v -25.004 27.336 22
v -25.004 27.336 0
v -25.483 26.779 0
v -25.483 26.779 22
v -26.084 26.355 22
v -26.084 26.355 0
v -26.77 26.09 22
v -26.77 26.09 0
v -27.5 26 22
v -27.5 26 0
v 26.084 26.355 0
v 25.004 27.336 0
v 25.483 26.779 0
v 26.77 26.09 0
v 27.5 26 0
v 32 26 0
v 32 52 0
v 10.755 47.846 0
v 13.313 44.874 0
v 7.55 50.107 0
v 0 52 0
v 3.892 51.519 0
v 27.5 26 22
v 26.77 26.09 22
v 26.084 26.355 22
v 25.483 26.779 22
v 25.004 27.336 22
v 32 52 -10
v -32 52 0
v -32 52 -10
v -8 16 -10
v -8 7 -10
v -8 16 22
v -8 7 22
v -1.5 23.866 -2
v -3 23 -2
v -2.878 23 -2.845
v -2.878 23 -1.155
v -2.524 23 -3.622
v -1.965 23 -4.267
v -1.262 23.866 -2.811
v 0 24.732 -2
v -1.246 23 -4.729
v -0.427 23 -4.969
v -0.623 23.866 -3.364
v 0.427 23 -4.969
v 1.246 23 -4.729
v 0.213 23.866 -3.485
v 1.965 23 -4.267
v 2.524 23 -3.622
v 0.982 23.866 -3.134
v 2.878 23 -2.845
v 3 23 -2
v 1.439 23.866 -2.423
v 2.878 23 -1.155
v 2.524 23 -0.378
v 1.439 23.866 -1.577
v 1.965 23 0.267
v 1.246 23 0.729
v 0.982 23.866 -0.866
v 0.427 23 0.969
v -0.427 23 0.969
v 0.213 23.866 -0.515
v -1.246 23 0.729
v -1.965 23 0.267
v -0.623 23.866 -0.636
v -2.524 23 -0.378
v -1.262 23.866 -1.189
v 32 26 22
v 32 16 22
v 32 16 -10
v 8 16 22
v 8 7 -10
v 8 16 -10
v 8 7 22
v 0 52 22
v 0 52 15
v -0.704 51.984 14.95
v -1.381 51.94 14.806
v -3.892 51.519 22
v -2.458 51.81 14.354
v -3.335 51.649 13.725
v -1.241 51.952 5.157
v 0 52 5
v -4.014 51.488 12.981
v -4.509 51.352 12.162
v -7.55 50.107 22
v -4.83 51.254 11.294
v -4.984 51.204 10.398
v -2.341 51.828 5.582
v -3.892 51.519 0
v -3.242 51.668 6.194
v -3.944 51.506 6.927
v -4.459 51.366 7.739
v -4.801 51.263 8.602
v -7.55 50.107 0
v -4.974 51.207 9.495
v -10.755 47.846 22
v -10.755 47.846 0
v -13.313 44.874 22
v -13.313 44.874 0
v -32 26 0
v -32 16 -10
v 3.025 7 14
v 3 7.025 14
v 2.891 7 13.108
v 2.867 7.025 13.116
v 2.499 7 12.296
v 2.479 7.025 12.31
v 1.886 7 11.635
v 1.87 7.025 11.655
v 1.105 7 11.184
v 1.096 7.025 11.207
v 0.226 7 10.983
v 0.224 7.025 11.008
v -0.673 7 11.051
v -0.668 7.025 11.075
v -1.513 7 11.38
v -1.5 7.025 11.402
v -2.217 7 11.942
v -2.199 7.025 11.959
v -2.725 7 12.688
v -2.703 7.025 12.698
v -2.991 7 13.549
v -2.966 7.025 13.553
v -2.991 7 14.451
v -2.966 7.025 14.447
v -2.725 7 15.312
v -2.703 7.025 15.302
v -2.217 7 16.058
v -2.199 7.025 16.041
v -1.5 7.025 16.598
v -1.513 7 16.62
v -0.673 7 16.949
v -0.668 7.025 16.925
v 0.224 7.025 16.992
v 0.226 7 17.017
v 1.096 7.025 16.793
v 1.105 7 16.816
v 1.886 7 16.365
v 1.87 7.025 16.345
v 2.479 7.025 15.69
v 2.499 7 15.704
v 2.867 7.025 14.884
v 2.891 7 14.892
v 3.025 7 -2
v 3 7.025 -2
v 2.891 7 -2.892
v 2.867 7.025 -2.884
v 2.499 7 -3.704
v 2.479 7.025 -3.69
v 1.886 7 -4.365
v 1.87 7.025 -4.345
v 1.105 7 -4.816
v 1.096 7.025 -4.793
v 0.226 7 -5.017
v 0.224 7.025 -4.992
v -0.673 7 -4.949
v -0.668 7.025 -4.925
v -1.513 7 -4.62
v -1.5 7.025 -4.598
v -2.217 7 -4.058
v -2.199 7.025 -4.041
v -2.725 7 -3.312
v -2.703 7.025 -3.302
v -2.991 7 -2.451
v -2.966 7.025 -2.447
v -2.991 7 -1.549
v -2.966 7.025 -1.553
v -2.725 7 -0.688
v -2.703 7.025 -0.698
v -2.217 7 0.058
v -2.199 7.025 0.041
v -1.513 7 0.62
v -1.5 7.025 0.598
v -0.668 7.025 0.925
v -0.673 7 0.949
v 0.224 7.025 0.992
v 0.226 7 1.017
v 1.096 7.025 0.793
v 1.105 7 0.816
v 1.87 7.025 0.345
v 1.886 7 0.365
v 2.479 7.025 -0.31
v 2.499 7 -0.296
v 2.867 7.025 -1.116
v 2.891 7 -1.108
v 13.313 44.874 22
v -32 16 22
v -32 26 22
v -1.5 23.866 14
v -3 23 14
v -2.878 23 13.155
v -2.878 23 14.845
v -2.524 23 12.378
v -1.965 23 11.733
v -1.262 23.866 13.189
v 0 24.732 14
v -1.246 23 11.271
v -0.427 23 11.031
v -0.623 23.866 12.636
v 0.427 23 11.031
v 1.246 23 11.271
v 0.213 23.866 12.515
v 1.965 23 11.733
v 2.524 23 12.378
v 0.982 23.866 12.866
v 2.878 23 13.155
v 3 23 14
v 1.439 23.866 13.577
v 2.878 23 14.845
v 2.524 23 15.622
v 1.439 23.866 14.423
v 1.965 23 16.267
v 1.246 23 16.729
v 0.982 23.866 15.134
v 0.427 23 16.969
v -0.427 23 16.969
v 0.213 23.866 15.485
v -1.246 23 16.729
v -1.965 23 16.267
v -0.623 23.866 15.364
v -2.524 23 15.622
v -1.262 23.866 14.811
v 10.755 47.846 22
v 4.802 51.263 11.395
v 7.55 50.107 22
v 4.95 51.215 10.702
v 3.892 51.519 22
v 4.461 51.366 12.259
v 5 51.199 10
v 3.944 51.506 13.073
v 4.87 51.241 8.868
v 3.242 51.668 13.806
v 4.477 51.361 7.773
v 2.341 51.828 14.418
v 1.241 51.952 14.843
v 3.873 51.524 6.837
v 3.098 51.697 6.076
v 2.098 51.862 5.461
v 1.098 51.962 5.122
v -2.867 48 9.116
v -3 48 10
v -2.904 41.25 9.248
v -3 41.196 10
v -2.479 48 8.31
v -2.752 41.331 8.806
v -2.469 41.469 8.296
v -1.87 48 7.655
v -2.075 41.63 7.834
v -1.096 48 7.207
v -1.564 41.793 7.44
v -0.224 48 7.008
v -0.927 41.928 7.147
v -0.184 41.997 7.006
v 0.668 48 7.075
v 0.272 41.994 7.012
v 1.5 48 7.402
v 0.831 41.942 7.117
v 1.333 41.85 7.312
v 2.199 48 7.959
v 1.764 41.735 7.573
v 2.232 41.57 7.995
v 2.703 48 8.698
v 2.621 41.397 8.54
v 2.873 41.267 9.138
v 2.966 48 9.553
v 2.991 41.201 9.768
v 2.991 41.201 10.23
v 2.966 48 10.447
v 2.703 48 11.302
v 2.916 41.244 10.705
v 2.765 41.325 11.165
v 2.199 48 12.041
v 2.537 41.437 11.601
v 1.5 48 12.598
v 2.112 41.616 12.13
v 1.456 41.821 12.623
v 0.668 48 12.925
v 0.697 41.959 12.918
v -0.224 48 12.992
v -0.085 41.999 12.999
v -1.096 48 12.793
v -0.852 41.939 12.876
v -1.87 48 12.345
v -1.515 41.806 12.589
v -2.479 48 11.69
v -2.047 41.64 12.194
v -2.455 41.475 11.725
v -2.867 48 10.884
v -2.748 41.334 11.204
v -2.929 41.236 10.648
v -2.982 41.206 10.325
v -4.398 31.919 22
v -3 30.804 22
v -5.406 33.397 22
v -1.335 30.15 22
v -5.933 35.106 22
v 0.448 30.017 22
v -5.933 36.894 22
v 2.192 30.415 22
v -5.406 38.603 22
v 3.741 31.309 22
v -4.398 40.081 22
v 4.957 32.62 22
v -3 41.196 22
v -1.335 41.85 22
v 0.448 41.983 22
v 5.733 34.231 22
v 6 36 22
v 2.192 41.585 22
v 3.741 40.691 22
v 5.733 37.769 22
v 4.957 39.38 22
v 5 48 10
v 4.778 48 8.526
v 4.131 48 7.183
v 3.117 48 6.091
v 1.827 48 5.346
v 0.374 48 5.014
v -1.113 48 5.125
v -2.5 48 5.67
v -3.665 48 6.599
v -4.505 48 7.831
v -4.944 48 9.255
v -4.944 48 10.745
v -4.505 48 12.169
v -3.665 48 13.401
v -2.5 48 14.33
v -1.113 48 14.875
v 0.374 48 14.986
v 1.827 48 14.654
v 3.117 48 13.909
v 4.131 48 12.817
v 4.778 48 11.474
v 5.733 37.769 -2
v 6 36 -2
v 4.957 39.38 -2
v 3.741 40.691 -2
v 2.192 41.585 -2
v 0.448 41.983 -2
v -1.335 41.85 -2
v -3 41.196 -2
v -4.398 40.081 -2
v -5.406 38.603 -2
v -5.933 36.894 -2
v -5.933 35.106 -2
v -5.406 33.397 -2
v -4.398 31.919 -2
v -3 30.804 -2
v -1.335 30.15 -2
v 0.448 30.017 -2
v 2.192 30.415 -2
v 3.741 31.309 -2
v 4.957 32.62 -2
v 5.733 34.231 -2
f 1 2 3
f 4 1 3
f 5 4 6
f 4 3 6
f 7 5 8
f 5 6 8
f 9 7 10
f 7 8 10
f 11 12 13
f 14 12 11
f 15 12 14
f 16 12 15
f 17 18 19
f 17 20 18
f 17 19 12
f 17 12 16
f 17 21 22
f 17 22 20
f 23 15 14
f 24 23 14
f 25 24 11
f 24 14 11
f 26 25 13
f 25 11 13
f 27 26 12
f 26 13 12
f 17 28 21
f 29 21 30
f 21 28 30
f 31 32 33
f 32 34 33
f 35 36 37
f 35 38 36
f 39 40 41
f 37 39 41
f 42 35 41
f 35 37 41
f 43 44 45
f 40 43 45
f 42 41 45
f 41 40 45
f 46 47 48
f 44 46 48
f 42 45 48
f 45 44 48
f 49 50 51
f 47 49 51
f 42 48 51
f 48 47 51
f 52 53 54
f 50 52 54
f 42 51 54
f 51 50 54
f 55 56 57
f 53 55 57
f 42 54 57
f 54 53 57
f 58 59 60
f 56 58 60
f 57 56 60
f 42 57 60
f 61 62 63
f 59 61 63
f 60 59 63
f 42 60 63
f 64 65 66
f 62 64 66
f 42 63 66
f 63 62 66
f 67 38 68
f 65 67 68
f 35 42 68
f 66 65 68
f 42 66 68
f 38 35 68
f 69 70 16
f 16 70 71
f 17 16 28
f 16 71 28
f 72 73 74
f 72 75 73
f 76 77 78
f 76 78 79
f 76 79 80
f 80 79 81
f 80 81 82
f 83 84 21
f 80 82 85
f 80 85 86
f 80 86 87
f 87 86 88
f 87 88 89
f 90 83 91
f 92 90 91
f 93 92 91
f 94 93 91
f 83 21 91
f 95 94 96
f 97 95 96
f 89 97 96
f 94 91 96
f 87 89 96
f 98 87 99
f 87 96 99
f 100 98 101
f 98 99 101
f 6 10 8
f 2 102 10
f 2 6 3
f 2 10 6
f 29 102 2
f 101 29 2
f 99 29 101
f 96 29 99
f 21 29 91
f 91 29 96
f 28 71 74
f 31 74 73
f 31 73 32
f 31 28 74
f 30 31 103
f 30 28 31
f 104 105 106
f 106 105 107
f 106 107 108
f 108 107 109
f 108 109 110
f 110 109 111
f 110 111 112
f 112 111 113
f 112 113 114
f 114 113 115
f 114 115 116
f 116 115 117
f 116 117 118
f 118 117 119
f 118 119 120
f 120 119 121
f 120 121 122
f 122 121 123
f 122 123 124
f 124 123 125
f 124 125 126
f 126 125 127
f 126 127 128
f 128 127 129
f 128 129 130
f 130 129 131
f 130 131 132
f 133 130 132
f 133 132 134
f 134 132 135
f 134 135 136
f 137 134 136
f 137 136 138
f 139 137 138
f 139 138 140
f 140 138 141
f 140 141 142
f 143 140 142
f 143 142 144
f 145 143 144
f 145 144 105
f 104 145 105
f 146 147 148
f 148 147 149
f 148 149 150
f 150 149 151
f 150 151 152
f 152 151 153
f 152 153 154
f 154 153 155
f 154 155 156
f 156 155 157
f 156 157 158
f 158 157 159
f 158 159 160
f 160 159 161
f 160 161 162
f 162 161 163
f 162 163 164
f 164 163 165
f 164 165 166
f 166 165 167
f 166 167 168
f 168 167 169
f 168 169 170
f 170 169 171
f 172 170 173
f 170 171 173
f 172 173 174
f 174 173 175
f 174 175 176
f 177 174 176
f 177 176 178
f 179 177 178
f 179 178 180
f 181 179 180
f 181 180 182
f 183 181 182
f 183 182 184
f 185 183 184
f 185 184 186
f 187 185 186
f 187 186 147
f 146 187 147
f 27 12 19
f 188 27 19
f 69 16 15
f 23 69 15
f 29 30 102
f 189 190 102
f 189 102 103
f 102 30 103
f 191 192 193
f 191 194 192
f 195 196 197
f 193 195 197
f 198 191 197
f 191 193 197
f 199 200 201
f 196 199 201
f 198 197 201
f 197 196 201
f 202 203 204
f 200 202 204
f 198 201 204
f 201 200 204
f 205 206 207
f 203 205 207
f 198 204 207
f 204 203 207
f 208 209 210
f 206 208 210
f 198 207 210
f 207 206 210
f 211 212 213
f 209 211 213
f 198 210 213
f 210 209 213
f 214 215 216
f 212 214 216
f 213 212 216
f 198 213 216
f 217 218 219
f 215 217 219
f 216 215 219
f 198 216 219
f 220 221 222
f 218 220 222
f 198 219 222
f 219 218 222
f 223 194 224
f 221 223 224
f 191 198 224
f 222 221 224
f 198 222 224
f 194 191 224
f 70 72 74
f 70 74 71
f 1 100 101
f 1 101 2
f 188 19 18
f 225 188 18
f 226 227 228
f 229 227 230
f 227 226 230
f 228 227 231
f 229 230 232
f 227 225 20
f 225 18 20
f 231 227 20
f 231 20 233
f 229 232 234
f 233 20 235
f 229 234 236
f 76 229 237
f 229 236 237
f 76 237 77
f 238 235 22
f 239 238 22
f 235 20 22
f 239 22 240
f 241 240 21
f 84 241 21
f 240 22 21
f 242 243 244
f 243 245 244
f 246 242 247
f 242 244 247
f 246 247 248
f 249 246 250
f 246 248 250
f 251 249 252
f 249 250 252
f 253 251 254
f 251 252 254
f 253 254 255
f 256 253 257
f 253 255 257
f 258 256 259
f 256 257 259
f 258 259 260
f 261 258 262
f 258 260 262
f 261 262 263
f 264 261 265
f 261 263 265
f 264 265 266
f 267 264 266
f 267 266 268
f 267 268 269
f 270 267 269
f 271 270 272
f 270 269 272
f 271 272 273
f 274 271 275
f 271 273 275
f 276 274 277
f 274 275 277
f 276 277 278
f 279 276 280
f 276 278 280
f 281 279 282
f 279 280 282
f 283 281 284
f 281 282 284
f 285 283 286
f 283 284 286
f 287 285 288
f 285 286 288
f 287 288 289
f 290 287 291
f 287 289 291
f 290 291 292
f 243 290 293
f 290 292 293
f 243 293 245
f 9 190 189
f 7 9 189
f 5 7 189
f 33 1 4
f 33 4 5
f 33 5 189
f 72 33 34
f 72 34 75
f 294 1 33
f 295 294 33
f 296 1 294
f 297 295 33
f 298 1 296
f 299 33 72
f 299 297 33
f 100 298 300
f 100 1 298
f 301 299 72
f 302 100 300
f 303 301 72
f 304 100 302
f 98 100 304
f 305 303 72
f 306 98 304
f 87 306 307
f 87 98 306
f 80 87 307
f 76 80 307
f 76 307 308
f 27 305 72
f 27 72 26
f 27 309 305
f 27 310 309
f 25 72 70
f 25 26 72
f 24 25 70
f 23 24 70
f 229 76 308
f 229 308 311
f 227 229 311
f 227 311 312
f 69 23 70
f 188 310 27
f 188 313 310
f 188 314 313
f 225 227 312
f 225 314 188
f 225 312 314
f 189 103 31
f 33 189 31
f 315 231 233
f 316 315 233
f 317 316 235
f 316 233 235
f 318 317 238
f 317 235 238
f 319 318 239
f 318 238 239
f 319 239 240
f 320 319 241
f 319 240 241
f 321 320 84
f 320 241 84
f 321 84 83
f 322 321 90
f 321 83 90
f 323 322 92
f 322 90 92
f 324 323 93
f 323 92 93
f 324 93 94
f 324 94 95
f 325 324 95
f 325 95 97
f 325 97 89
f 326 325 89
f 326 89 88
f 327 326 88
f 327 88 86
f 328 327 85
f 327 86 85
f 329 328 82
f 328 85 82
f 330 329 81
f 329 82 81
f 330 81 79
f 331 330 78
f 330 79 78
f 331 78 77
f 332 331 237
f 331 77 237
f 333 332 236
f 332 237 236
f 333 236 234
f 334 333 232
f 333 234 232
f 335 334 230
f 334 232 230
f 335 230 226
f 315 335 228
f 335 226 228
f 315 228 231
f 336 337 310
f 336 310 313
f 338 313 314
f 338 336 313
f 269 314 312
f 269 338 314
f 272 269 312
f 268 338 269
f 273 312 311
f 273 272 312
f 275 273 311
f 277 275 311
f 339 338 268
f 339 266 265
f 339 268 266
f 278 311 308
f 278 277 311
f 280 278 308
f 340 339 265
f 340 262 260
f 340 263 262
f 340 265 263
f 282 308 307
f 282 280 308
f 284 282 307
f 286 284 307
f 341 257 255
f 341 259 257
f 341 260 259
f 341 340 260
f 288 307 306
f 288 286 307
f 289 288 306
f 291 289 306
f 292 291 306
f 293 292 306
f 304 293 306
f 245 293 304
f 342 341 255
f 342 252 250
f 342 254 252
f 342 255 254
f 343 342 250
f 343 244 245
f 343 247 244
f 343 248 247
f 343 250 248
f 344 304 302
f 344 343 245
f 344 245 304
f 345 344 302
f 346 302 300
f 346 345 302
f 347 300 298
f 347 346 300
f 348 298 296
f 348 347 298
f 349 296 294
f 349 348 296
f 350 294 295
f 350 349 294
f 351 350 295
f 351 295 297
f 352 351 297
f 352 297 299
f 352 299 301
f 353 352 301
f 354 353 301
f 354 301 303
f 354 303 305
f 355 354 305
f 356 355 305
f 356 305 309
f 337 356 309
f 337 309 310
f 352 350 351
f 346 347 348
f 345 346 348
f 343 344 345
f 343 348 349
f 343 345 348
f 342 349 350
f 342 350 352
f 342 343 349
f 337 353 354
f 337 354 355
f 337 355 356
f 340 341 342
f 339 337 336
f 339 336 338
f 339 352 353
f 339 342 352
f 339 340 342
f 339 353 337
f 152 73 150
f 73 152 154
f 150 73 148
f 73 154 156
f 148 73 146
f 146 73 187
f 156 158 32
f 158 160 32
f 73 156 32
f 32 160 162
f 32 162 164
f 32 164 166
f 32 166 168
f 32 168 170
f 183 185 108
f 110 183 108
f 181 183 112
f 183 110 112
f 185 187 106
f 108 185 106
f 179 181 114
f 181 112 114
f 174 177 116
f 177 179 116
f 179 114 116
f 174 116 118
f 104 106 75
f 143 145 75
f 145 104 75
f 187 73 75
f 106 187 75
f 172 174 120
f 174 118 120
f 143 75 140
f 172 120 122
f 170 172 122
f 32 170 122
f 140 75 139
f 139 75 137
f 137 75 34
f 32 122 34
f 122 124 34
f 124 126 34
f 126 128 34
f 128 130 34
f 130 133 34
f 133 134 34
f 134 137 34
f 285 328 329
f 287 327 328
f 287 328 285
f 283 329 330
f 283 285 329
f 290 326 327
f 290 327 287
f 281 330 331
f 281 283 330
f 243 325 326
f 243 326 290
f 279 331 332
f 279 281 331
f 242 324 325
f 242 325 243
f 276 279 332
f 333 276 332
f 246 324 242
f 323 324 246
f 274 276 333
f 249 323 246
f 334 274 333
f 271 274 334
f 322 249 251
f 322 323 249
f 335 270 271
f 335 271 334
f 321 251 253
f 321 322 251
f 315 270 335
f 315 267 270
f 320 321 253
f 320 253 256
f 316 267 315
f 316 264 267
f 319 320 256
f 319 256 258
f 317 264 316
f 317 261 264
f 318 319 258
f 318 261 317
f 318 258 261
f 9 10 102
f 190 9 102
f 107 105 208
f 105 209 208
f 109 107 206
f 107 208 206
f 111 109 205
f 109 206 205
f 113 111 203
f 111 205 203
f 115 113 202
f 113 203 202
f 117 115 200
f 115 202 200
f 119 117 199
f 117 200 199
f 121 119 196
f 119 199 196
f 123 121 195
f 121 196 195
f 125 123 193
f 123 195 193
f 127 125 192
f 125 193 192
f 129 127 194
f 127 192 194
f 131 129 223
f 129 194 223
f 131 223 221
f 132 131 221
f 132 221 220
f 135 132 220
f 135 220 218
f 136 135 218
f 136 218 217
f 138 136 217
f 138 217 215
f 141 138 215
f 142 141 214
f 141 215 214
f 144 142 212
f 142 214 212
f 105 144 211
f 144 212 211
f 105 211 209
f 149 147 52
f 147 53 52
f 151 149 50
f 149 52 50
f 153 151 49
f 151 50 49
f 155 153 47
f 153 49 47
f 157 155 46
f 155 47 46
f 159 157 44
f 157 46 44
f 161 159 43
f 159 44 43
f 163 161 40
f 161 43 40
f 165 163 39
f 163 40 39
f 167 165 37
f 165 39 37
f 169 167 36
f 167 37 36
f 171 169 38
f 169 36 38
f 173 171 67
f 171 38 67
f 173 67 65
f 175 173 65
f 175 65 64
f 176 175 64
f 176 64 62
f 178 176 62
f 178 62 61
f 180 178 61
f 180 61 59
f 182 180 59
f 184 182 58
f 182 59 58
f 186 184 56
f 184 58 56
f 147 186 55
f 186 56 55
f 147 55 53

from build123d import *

# Parameters (mm, degrees)
SKETCH2_R                       = 6
SKETCH2_W                       = 16
SKETCH2_H                       = 9
BOSS_EXTRUDE1_DEPTH             = 22
BOSS_EXTRUDE2_START             = -10
SKETCH2_9_R                     = 6
BOSS_EXTRUDE2_DEPTH             = 10
CUT_EXTRUDE1_START              = -2
SKETCH3_R                       = 6
CUT_EXTRUDE1_DEPTH              = 2
SKETCH5_W                       = 16
SKETCH5_H                       = 9
BOSS_EXTRUDE3_DEPTH             = 10
M6X1_0_TAPPED_HOLE1_D           = 6
M6X1_0_TAPPED_HOLE1_DEPTH       = 16
M6X1_0_TAPPED_HOLE1_CSINK_D     = 6.05
M6X1_0_TAPPED_HOLE1_CSINK_ANGLE = 90
M6X1_0_TAPPED_HOLE1_TIP         = 1.732050808
HOLE1_D                         = 6
HOLE1_DEPTH                     = 15
HOLE1_CBORE_D                   = 10
HOLE1_CBORE_DEPTH               = 4


with BuildPart() as part:
    # Sketch2 → Boss-Extrude1 (new body)
    # profile 1 of 2: a face of its own
    with BuildSketch(Plane.XY):
        with BuildLine():
            Line((-32, 26), (-32, 16))
            Line((-32, 16), (-8, 16))
            Line((-8, 16), (8, 16))
            Line((8, 16), (32, 16))
            Line((32, 16), (32, 26))
            Line((32, 26), (27.5, 26))
            ThreePointArc((27.5, 26), (26.084330962, 26.355027189), (25.003729255, 27.336079218))
            Line((25.003729255, 27.336079218), (13.313443971, 44.874244172))
            ThreePointArc((13.313443971, 44.874244172), (7.550234872, 50.106521661), (0, 52))
            ThreePointArc((0, 52), (-7.550234872, 50.106521661), (-13.313443971, 44.874244172))
            Line((-13.313443971, 44.874244172), (-25.003729255, 27.336079218))
            ThreePointArc((-25.003729255, 27.336079218), (-26.084330962, 26.355027189), (-27.5, 26))
            Line((-27.5, 26), (-32, 26))
        make_face()
        with Locations((0, 36)):
            Circle(SKETCH2_R, mode=Mode.SUBTRACT)
    # profile 2 of 2: a face of its own
    with BuildSketch(Plane.XY):
        with Locations((0, 11.5)):
            Rectangle(SKETCH2_W, SKETCH2_H)
    extrude(amount=BOSS_EXTRUDE1_DEPTH)

    # Sketch2<9> → Boss-Extrude2 (add)
    # profile 1 of 4: a face of its own
    with BuildSketch(Plane.XY.offset(BOSS_EXTRUDE2_START)):
        with BuildLine():
            Line((32, 52), (0, 52))
            ThreePointArc((0, 52), (7.550234872, 50.106521661), (13.313443971, 44.874244172))
            Line((13.313443971, 44.874244172), (25.003729255, 27.336079218))
            ThreePointArc((25.003729255, 27.336079218), (26.084330962, 26.355027189), (27.5, 26))
            Line((27.5, 26), (32, 26))
            Line((32, 26), (32, 52))
        make_face()
    # profile 2 of 4: a face of its own
    with BuildSketch(Plane.XY.offset(BOSS_EXTRUDE2_START)):
        with BuildLine():
            Line((-32, 26), (-32, 16))
            Line((-32, 16), (-8, 16))
            Line((-8, 16), (8, 16))
            Line((8, 16), (32, 16))
            Line((32, 16), (32, 26))
            Line((32, 26), (27.5, 26))
            ThreePointArc((27.5, 26), (26.084330962, 26.355027189), (25.003729255, 27.336079218))
            Line((25.003729255, 27.336079218), (13.313443971, 44.874244172))
            ThreePointArc((13.313443971, 44.874244172), (7.550234872, 50.106521661), (0, 52))
            ThreePointArc((0, 52), (-7.550234872, 50.106521661), (-13.313443971, 44.874244172))
            Line((-13.313443971, 44.874244172), (-25.003729255, 27.336079218))
            ThreePointArc((-25.003729255, 27.336079218), (-26.084330962, 26.355027189), (-27.5, 26))
            Line((-27.5, 26), (-32, 26))
        make_face()
        with Locations((0, 36)):
            Circle(SKETCH2_9_R, mode=Mode.SUBTRACT)
    # profile 3 of 4: a face of its own
    with BuildSketch(Plane.XY.offset(BOSS_EXTRUDE2_START)):
        with BuildLine():
            Line((-32, 52), (-32, 26))
            Line((-32, 26), (-27.5, 26))
            ThreePointArc((-27.5, 26), (-26.084330962, 26.355027189), (-25.003729255, 27.336079218))
            Line((-25.003729255, 27.336079218), (-13.313443971, 44.874244172))
            ThreePointArc((-13.313443971, 44.874244172), (-7.550234872, 50.106521661), (0, 52))
            Line((0, 52), (-32, 52))
        make_face()
    # profile 4 of 4: a face of its own
    with BuildSketch(Plane.XY.offset(BOSS_EXTRUDE2_START)):
        with Locations((0, 36)):
            Circle(SKETCH2_9_R)
    extrude(amount=BOSS_EXTRUDE2_DEPTH)

    # Sketch3 → Cut-Extrude1 (cut)
    with BuildSketch(Plane.XY.offset(CUT_EXTRUDE1_START)):
        with Locations((0, 36)):
            Circle(SKETCH3_R)
    extrude(amount=CUT_EXTRUDE1_DEPTH, mode=Mode.SUBTRACT)

    # Sketch5 → Boss-Extrude3 (add)
    with BuildSketch(Plane(origin=(0, 0, 0), x_dir=(-1, 0, 0), z_dir=(0, 0, -1))):
        with Locations((0, 11.5)):
            Rectangle(SKETCH5_W, SKETCH5_H)
    extrude(amount=BOSS_EXTRUDE3_DEPTH)

    # M6x1.0 Tapped Hole1
    with Locations(Plane(origin=(0, 7, 14), x_dir=(-1, 0, 0), z_dir=(0, -1, 0))):
        with Locations((0, 0), (0, 16)):
            CounterSinkHole(M6X1_0_TAPPED_HOLE1_D / 2, M6X1_0_TAPPED_HOLE1_CSINK_D / 2, depth=M6X1_0_TAPPED_HOLE1_DEPTH, counter_sink_angle=M6X1_0_TAPPED_HOLE1_CSINK_ANGLE)
            with Locations((0, 0, -(M6X1_0_TAPPED_HOLE1_DEPTH + M6X1_0_TAPPED_HOLE1_TIP / 2))):  # 120° drill point
                Cone(0, M6X1_0_TAPPED_HOLE1_D / 2, M6X1_0_TAPPED_HOLE1_TIP, mode=Mode.SUBTRACT)

    # Hole1
    with Locations(Plane(origin=(0, 52, 10), x_dir=(1, 0, 0), z_dir=(0, 1, 0))):
        with Locations((0, 0)):
            CounterBoreHole(HOLE1_D / 2, HOLE1_CBORE_D / 2, HOLE1_CBORE_DEPTH, depth=HOLE1_DEPTH)


solid = part.part
